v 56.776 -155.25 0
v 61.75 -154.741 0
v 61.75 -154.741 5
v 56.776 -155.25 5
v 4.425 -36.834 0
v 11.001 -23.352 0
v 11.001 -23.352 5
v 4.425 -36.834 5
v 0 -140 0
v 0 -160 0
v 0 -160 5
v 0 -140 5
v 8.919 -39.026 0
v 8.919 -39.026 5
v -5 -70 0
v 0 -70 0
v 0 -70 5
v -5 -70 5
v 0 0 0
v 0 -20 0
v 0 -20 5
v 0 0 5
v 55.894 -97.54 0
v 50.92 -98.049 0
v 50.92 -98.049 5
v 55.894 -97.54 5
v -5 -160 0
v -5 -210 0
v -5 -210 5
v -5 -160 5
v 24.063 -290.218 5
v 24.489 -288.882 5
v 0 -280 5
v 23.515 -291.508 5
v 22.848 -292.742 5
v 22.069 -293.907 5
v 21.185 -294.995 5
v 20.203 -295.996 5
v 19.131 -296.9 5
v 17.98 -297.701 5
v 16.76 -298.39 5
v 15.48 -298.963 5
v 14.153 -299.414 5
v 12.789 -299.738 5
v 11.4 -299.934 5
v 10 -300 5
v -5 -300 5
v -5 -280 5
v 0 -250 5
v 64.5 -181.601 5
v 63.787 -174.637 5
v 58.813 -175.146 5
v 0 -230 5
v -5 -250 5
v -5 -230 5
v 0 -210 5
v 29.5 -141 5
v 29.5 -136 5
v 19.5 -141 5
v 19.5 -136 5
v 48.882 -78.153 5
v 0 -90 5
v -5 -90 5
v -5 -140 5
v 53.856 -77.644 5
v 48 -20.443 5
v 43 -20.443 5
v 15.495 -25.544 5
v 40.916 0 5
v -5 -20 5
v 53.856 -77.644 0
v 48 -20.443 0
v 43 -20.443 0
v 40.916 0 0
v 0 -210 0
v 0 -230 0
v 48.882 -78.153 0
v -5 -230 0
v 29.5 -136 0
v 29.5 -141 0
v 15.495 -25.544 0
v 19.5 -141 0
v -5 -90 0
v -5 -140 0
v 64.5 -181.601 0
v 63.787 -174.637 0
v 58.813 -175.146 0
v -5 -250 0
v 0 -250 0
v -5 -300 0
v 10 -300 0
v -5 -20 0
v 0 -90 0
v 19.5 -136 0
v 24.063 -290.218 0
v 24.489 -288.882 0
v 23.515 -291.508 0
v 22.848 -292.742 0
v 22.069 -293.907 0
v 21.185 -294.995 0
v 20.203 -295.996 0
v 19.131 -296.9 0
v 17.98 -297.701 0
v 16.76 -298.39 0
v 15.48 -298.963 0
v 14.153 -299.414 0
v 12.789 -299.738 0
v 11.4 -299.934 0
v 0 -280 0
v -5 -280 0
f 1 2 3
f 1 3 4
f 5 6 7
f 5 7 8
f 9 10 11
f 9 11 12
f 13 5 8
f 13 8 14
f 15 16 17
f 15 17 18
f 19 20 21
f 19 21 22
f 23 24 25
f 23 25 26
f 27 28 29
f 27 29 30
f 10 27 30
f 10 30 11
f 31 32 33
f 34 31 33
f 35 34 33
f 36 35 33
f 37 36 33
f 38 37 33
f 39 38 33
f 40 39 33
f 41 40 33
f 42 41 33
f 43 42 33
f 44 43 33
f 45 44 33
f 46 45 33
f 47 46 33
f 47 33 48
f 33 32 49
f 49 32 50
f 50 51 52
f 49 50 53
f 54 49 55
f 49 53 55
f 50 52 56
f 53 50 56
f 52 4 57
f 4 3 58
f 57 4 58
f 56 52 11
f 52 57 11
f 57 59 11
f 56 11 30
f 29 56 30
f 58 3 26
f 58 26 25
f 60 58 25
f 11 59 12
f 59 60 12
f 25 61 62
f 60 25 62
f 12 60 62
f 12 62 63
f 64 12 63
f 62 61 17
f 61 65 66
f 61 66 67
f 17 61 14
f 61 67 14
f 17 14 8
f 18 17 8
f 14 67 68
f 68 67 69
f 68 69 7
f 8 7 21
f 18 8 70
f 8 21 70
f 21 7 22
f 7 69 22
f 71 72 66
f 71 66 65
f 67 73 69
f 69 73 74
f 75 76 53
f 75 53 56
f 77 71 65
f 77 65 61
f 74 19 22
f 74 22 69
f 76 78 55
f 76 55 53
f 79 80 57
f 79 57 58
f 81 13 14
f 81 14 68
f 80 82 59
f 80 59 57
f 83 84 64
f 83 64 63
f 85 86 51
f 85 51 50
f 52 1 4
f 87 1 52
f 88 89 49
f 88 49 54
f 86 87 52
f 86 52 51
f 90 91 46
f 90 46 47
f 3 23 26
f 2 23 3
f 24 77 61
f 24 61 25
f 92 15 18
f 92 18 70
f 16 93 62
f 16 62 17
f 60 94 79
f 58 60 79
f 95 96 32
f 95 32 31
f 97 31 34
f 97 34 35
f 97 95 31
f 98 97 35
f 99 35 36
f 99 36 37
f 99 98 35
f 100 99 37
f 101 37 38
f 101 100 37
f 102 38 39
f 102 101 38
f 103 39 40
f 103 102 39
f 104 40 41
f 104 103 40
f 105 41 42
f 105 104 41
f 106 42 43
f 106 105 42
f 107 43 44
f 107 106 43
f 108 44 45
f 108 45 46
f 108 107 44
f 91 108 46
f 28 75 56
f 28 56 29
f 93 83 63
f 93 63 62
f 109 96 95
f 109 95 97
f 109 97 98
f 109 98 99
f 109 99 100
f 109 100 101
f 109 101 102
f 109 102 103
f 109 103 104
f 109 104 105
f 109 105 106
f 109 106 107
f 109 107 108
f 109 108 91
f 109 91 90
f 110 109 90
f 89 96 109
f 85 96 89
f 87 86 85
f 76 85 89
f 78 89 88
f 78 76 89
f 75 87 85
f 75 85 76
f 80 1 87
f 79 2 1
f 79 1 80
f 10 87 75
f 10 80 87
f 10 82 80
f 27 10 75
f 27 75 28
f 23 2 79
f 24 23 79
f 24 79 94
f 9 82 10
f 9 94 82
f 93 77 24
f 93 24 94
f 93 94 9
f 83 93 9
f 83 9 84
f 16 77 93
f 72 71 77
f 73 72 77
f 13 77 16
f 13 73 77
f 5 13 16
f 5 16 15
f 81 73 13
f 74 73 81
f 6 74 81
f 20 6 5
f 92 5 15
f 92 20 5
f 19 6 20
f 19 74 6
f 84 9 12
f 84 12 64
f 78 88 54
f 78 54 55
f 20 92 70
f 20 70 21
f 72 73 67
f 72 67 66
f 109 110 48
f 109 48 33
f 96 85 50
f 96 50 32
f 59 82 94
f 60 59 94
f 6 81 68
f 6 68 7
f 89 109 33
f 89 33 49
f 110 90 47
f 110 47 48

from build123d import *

# Parameters (mm, degrees)
ESQUISSE1_W             = 10
ESQUISSE1_H             = 5
BOSS_EXTRU_1_DEPTH      = 5
ENL_V_MAT_EXTRU_1_DEPTH = 307.896155075


with BuildPart() as part:
    # Esquisse1 → Boss.-Extru.1 (new body)
    with BuildSketch(Plane.XY):
        with BuildLine():
            Line((0, 0), (43, 0))
            Line((43, 0), (43, -20.443064708))
            Line((43, -20.443064708), (48, -20.443064708))
            Line((48, -20.443064708), (53.856481481, -77.64404044))
            Line((53.856481481, -77.64404044), (48.882483592, -78.153299699))
            Line((48.882483592, -78.153299699), (50.919520629, -98.049291258))
            Line((50.919520629, -98.049291258), (55.893518519, -97.540031998))
            Line((55.893518519, -97.540031998), (61.75, -154.74100773))
            Line((61.75, -154.74100773), (56.77600211, -155.250266989))
            Line((56.77600211, -155.250266989), (58.813039147, -175.146258548))
            Line((58.813039147, -175.146258548), (63.787037037, -174.636999289))
            Line((63.787037037, -174.636999289), (64.5, -181.600596335))
            Line((64.5, -181.600596335), (24.488887394, -288.882285677))
            ThreePointArc((24.488887394, -288.882285677), (19.131421435, -296.900300104), (10, -300))
            Line((10, -300), (-5, -300))
            Line((-5, -300), (-5, -280))
            Line((-5, -280), (0, -280))
            Line((0, -280), (0, -250))
            Line((0, -250), (-5, -250))
            Line((-5, -250), (-5, -230))
            Line((-5, -230), (0, -230))
            Line((0, -230), (0, -210))
            Line((0, -210), (-5, -210))
            Line((-5, -210), (-5, -160))
            Line((-5, -160), (0, -160))
            Line((0, -160), (0, -140))
            Line((0, -140), (-5, -140))
            Line((-5, -140), (-5, -90))
            Line((-5, -90), (0, -90))
            Line((0, -90), (0, -70))
            Line((0, -70), (-5, -70))
            Line((-5, -70), (-5, -20))
            Line((-5, -20), (0, -20))
            Line((0, -20), (0, 0))
        make_face()
        with Locations((24.5, -138.5)):
            Rectangle(ESQUISSE1_W, ESQUISSE1_H, mode=Mode.SUBTRACT)
        Polygon((11.000546858, -23.352307985), (4.424979656, -36.83421868), (8.918949887, -39.026074414), (15.494517089, -25.544163719), align=None, mode=Mode.SUBTRACT)
    extrude(amount=BOSS_EXTRU_1_DEPTH)

    # Esquisse3 → Enlèv. mat.-Extru.1 (cut, through all)
    with BuildSketch(Plane(origin=(0, 0, 0), x_dir=(-1, 0, 0), z_dir=(0, 0, -1))):
        Polygon((-43, -20.443064708), (-40.91621031, 0), (-43, 0), align=None)
    extrude(amount=-ENL_V_MAT_EXTRU_1_DEPTH, mode=Mode.SUBTRACT)


solid = part.part
